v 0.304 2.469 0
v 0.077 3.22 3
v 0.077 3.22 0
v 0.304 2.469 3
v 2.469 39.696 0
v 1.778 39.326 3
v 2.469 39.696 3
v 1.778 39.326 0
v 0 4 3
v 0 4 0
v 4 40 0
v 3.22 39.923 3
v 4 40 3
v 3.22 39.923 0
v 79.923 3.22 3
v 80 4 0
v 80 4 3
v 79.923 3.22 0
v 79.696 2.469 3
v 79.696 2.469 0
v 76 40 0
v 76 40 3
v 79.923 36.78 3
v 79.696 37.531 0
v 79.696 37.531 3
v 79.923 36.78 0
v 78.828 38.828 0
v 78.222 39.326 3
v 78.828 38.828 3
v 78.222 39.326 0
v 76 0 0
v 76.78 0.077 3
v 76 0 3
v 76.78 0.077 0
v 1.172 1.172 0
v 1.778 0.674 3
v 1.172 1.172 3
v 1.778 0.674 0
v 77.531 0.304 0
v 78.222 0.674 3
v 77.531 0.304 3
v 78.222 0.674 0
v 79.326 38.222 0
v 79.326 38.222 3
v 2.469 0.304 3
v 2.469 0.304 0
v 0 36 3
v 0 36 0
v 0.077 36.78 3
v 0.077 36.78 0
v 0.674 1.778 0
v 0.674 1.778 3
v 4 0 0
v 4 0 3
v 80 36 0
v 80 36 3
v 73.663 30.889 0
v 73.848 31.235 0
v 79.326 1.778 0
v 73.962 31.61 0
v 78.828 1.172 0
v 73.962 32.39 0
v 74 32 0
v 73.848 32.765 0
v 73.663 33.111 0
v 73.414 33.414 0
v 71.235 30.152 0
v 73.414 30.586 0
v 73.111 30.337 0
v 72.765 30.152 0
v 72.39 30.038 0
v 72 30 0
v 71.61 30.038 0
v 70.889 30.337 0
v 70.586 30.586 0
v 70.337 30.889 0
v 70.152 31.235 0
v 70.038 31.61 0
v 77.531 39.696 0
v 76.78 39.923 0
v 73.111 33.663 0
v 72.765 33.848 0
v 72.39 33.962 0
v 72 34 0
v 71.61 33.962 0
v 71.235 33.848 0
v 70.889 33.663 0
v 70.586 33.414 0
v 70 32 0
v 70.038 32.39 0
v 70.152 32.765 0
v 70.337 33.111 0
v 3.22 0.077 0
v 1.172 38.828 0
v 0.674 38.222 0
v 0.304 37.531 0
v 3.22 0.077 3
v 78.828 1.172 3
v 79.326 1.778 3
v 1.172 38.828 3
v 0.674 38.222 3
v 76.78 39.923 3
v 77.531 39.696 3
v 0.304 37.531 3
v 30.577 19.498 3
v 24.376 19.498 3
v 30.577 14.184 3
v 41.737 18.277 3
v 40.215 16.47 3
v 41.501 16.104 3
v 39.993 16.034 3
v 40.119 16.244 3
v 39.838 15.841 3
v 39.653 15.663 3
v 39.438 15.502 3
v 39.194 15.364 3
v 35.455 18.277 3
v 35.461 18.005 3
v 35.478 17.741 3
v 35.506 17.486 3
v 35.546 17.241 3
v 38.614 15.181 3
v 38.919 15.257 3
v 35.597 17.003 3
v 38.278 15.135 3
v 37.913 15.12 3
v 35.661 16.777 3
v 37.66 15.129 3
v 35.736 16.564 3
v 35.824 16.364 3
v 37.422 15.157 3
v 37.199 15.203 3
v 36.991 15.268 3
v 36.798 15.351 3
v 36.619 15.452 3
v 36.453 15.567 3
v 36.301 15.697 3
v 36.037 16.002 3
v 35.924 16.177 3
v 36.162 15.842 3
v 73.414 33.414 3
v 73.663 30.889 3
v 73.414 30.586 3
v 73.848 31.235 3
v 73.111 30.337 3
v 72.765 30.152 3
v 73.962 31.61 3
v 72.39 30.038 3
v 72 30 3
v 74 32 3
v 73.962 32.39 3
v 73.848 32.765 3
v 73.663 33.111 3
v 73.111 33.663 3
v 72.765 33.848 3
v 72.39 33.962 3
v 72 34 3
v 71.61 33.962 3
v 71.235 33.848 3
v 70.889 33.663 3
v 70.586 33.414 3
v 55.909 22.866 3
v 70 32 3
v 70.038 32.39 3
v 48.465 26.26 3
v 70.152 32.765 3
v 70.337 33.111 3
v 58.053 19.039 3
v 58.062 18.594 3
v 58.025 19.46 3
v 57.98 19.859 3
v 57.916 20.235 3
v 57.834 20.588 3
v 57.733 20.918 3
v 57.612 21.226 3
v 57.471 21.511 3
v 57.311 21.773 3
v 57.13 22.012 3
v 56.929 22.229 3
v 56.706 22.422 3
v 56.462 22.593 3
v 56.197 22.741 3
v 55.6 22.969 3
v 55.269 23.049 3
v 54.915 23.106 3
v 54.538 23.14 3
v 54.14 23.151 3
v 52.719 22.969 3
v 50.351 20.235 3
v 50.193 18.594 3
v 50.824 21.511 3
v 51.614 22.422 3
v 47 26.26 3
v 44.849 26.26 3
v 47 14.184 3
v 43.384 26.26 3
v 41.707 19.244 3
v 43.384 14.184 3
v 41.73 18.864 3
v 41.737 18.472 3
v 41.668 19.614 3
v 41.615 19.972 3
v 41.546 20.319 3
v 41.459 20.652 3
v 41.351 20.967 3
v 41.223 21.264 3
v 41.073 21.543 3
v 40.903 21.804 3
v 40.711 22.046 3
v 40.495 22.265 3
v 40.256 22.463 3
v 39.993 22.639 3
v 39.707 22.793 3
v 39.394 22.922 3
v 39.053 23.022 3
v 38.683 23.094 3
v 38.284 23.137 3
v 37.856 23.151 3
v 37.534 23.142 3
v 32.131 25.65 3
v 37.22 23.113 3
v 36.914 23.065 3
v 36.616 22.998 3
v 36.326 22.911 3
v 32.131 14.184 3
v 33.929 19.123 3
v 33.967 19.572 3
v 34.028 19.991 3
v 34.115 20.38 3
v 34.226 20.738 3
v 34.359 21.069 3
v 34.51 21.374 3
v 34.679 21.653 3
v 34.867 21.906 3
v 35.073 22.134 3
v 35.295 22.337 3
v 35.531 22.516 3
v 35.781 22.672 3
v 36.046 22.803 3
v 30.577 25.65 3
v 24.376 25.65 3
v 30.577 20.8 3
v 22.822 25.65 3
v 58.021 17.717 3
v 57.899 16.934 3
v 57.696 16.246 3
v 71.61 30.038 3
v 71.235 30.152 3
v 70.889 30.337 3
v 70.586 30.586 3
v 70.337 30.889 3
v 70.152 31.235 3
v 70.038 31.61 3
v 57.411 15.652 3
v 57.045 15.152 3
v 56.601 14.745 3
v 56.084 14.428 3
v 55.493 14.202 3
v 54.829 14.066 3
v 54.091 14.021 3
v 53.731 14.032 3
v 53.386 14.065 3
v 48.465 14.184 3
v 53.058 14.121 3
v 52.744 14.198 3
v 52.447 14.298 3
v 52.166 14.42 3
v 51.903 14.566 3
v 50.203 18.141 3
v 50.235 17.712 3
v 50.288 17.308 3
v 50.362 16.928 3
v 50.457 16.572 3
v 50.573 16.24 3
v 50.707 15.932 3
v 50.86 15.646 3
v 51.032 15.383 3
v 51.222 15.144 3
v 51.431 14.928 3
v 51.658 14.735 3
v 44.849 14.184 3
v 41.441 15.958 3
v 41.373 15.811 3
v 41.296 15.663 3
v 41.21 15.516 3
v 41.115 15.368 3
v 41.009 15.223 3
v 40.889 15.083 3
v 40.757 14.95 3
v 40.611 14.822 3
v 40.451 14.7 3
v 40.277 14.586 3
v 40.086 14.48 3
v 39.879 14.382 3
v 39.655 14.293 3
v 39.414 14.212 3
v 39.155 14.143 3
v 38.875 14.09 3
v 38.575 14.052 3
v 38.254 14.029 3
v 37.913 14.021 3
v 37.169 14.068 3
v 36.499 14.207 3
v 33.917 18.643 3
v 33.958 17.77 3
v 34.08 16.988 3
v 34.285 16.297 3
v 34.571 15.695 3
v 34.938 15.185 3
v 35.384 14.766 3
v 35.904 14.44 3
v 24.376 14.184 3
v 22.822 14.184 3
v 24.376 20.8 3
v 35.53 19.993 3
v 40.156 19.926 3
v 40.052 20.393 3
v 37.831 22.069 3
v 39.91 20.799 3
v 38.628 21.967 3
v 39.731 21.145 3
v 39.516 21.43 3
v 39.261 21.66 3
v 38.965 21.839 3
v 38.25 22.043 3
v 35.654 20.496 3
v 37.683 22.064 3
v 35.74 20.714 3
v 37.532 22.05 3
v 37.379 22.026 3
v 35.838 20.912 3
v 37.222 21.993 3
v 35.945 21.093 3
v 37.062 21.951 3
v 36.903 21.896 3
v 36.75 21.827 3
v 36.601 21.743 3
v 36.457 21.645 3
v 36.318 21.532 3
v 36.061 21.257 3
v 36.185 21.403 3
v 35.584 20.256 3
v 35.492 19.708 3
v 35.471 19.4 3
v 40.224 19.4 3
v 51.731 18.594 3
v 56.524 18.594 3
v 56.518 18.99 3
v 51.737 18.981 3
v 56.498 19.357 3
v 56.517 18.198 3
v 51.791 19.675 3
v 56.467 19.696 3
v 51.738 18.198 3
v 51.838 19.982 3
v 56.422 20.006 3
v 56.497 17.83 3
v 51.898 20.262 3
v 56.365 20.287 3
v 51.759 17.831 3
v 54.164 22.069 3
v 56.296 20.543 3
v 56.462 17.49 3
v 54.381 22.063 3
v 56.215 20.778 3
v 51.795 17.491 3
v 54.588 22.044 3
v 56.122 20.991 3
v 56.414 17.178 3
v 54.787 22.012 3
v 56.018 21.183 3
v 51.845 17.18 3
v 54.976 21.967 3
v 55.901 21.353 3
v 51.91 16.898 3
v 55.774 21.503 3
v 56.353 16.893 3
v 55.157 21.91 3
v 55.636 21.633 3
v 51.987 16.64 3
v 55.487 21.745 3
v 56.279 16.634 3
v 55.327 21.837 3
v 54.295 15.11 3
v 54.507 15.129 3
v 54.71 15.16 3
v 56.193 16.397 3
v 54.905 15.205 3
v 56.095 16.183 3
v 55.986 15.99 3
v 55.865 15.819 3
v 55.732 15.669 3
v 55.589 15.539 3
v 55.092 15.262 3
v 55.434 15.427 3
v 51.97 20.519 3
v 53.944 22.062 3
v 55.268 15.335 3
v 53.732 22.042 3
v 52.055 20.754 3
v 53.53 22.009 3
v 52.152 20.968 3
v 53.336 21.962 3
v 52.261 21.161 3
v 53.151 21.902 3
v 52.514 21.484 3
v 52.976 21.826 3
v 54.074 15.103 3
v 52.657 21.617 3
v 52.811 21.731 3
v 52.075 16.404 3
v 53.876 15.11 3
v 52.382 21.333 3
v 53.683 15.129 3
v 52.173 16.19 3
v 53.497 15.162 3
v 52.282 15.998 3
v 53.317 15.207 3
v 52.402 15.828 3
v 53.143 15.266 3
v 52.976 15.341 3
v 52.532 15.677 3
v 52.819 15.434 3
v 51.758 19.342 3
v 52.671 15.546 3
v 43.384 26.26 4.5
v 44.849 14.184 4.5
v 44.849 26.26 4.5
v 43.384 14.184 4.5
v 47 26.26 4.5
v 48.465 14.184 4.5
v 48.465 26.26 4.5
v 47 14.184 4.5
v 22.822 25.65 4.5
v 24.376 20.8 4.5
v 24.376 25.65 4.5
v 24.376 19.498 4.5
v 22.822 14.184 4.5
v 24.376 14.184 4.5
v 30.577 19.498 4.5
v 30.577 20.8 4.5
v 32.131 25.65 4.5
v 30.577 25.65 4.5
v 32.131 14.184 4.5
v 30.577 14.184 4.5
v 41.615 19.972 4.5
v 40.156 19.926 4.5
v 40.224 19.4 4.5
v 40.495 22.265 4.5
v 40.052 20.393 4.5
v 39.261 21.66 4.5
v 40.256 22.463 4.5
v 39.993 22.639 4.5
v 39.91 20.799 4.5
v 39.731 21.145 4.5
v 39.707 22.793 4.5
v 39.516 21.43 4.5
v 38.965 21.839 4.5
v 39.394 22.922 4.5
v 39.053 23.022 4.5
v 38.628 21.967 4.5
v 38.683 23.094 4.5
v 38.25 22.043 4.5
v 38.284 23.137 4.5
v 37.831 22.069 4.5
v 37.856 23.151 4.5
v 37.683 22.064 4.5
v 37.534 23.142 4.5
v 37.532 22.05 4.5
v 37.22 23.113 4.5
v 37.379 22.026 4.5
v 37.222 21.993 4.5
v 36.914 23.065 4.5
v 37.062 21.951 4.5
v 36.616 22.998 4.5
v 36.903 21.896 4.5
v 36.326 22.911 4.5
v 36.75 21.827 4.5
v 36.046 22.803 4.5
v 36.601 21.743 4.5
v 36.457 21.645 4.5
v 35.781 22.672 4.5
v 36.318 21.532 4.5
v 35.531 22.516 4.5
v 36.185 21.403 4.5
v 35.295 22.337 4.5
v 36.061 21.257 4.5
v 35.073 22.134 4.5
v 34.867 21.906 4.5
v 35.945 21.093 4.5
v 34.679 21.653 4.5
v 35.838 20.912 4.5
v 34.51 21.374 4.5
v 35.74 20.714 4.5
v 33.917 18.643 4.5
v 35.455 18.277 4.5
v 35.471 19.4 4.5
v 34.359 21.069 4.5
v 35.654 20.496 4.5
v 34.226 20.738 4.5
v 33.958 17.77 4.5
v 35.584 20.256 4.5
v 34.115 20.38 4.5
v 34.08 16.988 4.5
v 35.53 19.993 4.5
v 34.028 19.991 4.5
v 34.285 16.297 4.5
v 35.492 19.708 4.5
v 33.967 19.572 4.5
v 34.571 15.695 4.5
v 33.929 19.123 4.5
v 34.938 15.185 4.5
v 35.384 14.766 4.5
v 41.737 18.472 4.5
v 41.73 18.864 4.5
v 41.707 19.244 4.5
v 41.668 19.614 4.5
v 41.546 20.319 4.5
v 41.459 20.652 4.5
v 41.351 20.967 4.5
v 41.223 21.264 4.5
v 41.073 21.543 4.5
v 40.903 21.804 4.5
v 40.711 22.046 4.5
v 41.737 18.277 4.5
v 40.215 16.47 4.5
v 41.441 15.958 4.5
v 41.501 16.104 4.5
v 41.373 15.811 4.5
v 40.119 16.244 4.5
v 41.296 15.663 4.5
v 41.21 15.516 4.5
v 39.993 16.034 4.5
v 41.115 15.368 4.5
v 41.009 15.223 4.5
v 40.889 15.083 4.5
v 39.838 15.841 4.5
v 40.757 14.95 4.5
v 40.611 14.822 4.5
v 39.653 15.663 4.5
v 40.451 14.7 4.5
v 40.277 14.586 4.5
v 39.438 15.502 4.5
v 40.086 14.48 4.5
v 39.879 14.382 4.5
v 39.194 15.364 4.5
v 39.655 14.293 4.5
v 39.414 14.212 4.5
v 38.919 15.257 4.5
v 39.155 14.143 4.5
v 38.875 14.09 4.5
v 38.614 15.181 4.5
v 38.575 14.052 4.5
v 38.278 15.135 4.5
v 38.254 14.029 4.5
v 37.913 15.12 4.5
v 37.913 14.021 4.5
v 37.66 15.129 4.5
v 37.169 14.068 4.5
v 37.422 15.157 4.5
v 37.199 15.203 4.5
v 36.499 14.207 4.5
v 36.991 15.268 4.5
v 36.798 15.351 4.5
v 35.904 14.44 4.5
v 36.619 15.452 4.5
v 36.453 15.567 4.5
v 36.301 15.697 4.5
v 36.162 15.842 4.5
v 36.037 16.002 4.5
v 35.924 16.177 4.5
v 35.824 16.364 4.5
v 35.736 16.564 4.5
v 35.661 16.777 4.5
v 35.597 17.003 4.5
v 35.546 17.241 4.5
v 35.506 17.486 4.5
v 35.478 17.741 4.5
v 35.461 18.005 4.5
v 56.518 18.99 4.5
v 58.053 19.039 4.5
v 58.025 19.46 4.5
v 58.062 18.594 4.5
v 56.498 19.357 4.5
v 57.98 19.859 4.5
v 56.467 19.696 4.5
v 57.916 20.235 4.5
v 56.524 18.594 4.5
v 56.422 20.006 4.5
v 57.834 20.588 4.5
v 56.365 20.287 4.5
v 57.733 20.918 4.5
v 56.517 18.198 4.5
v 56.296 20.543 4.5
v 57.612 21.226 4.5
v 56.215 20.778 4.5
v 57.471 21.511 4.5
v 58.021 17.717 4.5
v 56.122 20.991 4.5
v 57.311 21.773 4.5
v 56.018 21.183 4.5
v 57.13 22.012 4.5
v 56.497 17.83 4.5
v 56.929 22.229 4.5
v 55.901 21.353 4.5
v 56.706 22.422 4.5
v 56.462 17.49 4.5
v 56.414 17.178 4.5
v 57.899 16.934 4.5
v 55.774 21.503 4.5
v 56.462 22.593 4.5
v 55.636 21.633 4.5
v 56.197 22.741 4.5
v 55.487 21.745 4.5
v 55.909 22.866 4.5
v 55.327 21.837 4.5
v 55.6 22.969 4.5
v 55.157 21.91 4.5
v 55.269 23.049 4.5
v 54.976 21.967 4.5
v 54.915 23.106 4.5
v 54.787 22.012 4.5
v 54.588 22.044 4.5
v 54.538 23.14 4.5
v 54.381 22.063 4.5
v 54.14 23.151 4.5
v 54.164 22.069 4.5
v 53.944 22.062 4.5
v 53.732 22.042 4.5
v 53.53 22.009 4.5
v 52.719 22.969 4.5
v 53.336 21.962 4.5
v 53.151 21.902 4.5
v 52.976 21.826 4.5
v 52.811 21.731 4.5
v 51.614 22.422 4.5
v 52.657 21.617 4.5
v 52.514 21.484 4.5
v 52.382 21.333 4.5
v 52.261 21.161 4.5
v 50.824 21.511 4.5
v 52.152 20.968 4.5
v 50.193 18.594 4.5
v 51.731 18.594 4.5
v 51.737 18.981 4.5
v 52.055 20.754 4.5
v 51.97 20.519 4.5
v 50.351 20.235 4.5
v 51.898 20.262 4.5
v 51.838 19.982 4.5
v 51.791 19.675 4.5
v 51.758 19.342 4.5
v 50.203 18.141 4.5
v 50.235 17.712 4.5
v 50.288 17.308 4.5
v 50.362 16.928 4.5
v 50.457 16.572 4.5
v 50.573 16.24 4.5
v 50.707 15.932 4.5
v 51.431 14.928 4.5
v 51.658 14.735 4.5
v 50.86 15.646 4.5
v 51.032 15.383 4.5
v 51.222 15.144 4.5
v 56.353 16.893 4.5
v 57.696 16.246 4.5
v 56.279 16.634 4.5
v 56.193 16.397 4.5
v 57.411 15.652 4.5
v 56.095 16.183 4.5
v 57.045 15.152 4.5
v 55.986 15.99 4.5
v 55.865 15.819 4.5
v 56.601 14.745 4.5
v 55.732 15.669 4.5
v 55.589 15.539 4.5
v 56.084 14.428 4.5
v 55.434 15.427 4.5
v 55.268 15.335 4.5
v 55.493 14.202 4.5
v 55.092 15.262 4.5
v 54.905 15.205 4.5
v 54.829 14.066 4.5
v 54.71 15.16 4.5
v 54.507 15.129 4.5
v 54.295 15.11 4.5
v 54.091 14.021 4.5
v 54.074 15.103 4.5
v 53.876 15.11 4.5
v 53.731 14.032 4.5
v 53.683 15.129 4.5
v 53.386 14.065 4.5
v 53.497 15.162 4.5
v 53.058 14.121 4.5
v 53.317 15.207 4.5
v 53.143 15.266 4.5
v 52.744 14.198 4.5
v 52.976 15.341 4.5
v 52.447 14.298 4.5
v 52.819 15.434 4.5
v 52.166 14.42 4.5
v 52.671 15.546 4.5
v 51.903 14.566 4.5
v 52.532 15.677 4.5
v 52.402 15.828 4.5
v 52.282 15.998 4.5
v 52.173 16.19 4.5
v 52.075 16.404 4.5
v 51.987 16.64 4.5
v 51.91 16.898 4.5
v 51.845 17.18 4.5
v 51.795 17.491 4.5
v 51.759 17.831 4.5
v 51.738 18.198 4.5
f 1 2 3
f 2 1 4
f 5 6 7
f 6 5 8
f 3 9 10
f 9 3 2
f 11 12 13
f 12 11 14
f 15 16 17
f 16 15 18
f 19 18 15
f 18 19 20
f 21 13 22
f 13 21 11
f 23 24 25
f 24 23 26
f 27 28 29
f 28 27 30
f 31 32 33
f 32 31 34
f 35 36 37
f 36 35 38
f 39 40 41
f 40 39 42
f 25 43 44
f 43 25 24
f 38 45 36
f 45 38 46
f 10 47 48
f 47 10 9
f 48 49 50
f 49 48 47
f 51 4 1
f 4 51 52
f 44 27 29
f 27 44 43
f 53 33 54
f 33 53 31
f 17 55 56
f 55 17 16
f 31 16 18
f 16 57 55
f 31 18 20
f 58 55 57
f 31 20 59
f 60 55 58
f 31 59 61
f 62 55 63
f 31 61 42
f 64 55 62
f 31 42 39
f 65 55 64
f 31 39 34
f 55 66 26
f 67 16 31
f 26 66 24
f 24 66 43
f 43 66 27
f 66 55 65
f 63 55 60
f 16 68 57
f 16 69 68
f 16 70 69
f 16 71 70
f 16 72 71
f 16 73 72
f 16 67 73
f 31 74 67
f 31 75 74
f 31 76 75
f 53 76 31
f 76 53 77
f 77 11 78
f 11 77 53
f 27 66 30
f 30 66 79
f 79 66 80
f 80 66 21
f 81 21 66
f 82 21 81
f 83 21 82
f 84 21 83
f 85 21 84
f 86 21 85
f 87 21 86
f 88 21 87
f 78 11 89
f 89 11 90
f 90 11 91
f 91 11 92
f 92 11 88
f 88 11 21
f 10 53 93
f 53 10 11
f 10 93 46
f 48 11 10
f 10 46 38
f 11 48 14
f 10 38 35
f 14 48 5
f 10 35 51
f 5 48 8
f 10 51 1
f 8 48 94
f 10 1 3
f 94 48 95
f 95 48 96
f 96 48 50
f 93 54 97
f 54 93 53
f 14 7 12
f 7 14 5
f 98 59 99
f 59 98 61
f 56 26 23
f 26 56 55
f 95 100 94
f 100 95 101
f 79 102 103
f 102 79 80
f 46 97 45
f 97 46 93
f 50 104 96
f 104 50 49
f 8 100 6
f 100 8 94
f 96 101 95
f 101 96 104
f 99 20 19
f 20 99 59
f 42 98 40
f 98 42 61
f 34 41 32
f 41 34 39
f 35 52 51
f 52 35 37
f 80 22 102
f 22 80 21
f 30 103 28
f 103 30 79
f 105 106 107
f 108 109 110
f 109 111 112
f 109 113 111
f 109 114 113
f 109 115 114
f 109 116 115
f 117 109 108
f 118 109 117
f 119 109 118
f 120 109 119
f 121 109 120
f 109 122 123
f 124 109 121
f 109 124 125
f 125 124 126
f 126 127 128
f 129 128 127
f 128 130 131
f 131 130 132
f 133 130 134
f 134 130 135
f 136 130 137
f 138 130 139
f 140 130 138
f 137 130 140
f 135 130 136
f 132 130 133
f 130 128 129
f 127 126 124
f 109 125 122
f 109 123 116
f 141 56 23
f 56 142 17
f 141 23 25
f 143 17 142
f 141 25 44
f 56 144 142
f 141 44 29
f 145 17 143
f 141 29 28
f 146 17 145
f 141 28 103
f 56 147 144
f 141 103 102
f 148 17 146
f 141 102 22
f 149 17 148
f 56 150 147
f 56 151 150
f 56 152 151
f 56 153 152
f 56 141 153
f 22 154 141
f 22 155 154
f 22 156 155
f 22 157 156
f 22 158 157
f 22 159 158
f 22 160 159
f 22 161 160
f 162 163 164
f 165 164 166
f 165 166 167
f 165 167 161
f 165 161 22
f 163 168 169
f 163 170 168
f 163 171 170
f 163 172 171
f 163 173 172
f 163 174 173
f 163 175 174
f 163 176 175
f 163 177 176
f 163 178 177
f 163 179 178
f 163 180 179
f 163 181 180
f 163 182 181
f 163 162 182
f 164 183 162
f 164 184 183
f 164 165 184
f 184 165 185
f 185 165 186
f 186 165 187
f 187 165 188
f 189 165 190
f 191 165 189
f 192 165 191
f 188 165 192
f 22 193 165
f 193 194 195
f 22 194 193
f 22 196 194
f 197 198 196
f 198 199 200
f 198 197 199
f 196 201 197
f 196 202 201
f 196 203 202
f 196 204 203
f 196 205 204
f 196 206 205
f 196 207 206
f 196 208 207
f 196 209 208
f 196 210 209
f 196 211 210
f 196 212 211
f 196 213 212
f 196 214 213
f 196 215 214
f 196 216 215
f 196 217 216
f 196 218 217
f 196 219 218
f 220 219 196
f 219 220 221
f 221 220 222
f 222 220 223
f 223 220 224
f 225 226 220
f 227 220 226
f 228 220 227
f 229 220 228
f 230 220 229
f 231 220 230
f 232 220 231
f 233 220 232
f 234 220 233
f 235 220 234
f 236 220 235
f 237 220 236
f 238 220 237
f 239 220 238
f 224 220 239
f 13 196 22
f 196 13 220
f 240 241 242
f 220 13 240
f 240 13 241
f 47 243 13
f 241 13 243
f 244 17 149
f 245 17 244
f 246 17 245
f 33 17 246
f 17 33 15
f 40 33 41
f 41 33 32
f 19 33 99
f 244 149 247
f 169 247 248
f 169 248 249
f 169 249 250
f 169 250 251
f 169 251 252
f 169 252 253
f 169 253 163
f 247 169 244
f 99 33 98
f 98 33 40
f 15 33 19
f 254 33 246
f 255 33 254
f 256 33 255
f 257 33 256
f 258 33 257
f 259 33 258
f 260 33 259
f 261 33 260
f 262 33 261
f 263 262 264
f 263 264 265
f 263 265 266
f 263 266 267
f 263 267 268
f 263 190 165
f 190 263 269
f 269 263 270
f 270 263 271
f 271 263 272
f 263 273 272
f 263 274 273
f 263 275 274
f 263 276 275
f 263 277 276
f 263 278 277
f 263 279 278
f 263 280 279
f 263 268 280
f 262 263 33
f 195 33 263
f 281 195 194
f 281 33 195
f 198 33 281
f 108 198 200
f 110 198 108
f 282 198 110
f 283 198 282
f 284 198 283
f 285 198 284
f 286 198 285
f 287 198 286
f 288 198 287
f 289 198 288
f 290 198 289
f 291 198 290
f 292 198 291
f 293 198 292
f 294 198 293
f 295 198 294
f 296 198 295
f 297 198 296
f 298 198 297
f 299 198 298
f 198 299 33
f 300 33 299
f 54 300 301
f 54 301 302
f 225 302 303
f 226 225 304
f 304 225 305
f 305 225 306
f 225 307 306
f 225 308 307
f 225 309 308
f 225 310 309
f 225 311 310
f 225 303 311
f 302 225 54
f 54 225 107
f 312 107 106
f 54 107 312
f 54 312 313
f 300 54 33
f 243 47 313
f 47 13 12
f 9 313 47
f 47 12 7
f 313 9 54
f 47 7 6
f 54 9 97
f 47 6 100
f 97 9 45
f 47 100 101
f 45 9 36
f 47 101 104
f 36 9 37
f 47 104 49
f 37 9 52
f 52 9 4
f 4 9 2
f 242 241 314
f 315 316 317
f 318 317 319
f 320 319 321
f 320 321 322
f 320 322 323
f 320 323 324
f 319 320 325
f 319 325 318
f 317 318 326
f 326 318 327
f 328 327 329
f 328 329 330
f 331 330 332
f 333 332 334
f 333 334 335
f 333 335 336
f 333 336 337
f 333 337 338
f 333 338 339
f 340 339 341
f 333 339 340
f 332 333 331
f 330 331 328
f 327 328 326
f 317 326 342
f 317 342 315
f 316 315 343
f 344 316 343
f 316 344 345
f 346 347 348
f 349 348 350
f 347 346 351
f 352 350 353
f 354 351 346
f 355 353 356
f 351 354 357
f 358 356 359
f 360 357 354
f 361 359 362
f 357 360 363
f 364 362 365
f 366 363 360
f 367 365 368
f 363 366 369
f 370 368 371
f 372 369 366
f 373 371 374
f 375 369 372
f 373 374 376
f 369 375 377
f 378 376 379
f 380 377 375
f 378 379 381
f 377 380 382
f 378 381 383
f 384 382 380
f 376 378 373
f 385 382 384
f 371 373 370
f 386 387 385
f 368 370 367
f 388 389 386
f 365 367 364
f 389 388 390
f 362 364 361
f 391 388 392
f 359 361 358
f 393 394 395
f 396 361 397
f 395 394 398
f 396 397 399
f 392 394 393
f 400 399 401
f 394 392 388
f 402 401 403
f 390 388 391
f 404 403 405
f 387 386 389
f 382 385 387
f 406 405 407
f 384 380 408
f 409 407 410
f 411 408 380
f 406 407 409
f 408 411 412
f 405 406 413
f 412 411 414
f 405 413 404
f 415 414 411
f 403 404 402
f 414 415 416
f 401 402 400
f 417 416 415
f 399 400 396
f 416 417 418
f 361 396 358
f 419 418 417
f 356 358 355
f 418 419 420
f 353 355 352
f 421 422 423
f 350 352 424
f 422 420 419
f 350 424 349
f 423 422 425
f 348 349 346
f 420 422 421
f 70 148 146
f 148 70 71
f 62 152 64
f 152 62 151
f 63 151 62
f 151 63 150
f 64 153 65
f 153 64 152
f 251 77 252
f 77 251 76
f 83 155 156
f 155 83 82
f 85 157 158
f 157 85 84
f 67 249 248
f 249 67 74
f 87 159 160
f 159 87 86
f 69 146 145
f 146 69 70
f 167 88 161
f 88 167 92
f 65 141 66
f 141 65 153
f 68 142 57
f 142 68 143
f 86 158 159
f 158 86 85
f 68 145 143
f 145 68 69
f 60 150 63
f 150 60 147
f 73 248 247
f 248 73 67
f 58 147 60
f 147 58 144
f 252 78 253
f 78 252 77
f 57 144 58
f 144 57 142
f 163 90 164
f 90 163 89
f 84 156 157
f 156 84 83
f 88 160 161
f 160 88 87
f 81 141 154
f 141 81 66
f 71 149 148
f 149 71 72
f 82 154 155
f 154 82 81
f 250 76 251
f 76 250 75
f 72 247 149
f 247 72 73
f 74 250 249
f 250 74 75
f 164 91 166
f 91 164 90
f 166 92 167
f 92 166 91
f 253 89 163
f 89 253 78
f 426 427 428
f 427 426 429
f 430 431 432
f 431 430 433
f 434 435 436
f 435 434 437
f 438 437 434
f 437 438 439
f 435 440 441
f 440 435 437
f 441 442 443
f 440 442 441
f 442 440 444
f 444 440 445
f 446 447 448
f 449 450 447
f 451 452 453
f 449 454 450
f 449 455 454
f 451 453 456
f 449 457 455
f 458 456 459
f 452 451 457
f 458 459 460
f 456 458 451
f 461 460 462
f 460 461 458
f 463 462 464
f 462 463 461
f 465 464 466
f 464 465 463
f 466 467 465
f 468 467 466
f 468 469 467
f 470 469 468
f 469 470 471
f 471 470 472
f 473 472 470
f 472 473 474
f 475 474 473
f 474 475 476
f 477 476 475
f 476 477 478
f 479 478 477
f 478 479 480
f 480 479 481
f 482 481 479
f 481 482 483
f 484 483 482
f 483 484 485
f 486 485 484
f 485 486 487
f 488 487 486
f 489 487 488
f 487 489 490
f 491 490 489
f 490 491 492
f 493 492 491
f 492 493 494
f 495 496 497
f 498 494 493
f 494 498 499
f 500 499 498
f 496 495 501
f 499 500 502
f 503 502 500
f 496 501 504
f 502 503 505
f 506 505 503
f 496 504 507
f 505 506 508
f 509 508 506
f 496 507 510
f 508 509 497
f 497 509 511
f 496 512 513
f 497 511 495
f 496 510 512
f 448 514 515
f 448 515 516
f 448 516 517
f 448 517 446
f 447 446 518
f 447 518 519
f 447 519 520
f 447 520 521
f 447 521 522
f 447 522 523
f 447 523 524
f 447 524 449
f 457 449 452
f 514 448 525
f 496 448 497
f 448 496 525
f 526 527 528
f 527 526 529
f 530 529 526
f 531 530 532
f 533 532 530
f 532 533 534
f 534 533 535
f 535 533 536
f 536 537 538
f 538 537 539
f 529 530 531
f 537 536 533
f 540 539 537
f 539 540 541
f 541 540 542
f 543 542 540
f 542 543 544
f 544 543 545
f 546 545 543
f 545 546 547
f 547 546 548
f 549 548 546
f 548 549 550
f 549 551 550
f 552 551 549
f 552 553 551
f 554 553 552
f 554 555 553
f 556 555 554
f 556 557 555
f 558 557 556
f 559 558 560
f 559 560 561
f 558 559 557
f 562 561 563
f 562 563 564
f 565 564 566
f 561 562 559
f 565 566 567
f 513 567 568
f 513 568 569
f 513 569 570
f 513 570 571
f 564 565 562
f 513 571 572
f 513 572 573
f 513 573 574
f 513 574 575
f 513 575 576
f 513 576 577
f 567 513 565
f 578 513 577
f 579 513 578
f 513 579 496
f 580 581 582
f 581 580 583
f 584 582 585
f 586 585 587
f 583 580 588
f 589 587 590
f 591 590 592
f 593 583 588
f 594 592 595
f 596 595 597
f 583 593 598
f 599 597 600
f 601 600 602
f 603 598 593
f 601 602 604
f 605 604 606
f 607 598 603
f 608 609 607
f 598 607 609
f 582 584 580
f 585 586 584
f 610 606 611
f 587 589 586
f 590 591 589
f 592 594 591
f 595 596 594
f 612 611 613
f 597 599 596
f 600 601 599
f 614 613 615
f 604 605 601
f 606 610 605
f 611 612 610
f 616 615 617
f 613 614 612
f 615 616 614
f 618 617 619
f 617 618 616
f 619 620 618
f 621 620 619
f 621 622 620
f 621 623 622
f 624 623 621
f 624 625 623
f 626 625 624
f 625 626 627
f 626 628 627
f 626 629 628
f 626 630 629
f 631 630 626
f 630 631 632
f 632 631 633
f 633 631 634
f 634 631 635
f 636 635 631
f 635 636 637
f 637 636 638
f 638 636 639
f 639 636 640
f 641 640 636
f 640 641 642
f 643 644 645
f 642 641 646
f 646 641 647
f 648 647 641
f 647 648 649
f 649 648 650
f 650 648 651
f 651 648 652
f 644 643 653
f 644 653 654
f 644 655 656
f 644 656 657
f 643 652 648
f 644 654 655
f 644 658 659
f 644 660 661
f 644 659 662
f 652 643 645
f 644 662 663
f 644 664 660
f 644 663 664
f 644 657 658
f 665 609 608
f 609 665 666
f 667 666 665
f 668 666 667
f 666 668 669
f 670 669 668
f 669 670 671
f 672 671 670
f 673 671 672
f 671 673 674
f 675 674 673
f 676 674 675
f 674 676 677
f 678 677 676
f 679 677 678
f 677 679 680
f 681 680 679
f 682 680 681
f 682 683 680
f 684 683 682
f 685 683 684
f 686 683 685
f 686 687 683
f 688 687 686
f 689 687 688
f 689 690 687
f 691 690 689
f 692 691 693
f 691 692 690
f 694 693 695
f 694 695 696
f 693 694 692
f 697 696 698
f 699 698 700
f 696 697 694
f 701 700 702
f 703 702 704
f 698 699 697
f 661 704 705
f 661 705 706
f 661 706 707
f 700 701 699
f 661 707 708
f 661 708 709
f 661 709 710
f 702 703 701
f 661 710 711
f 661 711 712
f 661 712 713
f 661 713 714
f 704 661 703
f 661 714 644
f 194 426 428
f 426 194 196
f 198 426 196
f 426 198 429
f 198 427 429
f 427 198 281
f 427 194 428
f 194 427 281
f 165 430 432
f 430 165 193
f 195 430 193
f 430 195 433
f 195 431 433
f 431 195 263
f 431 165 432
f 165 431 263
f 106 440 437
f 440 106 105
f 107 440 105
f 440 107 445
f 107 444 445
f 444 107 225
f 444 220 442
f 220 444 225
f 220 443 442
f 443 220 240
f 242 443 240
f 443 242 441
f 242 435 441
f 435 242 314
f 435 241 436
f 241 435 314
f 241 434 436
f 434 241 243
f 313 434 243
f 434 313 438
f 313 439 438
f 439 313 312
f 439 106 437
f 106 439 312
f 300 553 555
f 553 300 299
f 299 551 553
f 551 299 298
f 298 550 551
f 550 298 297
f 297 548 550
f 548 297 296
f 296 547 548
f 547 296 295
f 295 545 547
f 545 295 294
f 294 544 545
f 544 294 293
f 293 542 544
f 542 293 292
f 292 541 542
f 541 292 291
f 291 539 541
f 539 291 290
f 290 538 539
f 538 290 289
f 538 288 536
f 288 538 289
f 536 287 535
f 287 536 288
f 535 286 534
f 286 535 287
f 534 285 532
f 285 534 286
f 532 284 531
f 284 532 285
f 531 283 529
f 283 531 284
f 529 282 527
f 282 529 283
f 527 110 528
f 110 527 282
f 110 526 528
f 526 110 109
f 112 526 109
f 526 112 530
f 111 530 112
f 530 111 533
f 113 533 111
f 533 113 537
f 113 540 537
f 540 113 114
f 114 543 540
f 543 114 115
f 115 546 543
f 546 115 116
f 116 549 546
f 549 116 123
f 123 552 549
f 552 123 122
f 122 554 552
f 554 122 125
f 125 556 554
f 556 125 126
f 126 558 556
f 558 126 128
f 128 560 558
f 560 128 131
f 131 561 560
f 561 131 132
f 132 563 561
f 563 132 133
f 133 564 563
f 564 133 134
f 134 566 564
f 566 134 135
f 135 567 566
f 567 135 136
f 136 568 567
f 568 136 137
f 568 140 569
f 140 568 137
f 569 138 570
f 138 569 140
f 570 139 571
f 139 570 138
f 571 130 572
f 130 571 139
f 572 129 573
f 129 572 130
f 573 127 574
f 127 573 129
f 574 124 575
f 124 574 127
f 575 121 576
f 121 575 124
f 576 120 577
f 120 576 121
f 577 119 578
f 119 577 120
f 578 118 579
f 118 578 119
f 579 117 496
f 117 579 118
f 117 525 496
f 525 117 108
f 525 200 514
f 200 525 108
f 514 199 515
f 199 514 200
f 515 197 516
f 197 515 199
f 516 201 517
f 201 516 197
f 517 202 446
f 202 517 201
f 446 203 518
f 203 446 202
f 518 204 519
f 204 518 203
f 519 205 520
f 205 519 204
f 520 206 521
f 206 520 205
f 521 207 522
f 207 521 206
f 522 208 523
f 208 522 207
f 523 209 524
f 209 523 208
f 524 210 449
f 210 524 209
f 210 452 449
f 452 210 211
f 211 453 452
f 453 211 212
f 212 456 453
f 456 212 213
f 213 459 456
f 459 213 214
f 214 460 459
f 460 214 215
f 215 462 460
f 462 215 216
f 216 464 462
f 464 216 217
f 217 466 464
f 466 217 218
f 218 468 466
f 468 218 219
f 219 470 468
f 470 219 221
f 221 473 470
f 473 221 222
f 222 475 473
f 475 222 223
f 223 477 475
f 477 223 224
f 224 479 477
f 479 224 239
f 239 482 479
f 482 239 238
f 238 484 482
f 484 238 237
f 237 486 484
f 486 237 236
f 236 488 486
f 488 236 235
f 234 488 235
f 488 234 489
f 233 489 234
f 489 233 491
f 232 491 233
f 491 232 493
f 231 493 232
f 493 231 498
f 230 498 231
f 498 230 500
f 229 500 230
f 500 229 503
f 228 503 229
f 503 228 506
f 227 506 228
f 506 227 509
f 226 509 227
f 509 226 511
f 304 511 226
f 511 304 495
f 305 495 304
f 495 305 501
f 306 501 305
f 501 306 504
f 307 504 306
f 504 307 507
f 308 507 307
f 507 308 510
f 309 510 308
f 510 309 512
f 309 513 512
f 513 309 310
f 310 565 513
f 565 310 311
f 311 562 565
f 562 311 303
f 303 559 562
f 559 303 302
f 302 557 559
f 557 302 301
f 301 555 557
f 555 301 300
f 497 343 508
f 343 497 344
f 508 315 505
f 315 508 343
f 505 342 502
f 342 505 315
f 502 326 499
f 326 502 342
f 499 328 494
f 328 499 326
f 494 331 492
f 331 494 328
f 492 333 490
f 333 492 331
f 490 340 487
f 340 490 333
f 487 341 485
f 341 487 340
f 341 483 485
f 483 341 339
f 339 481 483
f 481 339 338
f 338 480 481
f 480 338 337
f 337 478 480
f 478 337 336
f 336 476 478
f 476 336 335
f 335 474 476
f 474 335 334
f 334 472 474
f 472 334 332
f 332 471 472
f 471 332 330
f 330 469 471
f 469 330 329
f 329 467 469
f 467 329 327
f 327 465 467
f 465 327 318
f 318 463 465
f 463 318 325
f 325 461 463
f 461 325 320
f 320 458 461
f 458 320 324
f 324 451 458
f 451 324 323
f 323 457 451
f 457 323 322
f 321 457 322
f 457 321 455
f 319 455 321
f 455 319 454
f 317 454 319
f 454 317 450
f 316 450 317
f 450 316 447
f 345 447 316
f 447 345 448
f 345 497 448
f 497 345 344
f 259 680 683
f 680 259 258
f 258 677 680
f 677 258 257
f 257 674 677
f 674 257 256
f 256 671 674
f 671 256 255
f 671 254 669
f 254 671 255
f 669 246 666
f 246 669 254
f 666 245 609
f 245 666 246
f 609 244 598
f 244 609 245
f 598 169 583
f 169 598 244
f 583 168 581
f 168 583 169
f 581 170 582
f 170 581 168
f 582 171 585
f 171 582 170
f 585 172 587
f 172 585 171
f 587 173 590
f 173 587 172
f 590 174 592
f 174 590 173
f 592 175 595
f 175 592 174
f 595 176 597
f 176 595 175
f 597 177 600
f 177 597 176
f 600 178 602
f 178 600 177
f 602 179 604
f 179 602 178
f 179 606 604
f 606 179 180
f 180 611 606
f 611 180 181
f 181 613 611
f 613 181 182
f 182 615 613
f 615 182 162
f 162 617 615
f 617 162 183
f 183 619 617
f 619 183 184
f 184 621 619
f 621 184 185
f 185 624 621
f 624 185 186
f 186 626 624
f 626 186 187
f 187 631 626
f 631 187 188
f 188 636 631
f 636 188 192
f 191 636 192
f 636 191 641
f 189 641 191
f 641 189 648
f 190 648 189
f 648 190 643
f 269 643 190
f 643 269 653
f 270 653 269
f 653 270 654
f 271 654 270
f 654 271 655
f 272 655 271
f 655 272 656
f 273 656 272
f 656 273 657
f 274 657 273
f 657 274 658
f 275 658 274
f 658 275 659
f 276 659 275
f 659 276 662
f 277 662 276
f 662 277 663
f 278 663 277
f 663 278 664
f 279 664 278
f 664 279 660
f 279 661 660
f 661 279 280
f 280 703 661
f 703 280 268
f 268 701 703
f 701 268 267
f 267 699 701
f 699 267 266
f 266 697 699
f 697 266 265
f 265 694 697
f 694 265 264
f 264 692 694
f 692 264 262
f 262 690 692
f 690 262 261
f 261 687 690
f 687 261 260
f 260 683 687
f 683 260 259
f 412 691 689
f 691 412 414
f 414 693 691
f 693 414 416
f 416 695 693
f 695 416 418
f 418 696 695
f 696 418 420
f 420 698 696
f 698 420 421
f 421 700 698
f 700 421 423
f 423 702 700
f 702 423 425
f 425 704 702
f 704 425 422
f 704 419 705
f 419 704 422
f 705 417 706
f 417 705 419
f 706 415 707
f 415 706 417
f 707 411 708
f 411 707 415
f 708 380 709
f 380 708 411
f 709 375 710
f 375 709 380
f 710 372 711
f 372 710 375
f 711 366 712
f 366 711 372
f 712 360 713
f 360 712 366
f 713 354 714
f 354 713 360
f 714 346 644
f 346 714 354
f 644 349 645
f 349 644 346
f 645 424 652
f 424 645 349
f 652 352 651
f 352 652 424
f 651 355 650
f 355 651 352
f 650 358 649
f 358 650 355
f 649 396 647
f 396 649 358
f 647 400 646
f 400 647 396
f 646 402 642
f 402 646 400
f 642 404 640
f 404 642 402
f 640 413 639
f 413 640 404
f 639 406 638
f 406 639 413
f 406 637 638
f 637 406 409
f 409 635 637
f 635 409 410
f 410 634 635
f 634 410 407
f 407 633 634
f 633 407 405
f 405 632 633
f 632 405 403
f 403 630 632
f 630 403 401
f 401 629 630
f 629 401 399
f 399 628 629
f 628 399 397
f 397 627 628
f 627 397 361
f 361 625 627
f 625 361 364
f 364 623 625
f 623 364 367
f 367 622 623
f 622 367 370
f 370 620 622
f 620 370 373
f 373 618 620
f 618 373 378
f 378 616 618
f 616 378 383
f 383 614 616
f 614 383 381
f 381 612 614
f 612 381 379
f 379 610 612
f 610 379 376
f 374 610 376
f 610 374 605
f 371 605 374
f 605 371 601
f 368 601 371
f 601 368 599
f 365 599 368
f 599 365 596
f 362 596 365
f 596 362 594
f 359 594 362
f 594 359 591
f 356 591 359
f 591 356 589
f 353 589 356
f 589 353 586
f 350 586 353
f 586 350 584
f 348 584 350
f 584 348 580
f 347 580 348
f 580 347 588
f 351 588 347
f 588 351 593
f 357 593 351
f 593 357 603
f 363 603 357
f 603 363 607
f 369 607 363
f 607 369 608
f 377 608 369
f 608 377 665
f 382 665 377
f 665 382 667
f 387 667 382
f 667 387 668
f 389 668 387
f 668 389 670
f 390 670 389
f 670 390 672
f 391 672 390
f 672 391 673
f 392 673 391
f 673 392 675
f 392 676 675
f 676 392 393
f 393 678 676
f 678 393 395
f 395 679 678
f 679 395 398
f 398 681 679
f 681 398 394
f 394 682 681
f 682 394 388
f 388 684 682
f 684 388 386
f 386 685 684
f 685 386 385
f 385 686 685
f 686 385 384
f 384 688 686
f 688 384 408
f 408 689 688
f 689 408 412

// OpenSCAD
// Yantra4D wrapper — Gift Tag
// Rounded rectangle with hanging hole and text

message = "Hello";
font_size = 12;
text_depth = 1.5;
base_width = 80;
base_height = 40;
base_thickness = 3;
raised = true;
hole_diameter = 4;
fn = 0;
render_mode = 0;

$fn = fn > 0 ? fn : 32;

corner_r = 4;
hole_r = hole_diameter / 2;
hole_x = base_width - corner_r - hole_r - 2;
hole_y = base_height - corner_r - hole_r - 2;

module rounded_rect(w, h, r) {
    hull() {
        translate([r, r]) circle(r);
        translate([w - r, r]) circle(r);
        translate([r, h - r]) circle(r);
        translate([w - r, h - r]) circle(r);
    }
}

module tag_base() {
    difference() {
        linear_extrude(base_thickness)
            rounded_rect(base_width, base_height, corner_r);
        // Hanging hole
        translate([hole_x, hole_y, -0.5])
            cylinder(h = base_thickness + 1, r = hole_r);
    }
}

if (raised) {
    union() {
        tag_base();
        translate([base_width / 2, base_height / 2, base_thickness])
            linear_extrude(text_depth)
                text(message, size = font_size, halign = "center", valign = "center");
    }
} else {
    difference() {
        tag_base();
        translate([base_width / 2, base_height / 2, base_thickness - text_depth])
            linear_extrude(text_depth + 0.1)
                text(message, size = font_size, halign = "center", valign = "center");
    }
}
